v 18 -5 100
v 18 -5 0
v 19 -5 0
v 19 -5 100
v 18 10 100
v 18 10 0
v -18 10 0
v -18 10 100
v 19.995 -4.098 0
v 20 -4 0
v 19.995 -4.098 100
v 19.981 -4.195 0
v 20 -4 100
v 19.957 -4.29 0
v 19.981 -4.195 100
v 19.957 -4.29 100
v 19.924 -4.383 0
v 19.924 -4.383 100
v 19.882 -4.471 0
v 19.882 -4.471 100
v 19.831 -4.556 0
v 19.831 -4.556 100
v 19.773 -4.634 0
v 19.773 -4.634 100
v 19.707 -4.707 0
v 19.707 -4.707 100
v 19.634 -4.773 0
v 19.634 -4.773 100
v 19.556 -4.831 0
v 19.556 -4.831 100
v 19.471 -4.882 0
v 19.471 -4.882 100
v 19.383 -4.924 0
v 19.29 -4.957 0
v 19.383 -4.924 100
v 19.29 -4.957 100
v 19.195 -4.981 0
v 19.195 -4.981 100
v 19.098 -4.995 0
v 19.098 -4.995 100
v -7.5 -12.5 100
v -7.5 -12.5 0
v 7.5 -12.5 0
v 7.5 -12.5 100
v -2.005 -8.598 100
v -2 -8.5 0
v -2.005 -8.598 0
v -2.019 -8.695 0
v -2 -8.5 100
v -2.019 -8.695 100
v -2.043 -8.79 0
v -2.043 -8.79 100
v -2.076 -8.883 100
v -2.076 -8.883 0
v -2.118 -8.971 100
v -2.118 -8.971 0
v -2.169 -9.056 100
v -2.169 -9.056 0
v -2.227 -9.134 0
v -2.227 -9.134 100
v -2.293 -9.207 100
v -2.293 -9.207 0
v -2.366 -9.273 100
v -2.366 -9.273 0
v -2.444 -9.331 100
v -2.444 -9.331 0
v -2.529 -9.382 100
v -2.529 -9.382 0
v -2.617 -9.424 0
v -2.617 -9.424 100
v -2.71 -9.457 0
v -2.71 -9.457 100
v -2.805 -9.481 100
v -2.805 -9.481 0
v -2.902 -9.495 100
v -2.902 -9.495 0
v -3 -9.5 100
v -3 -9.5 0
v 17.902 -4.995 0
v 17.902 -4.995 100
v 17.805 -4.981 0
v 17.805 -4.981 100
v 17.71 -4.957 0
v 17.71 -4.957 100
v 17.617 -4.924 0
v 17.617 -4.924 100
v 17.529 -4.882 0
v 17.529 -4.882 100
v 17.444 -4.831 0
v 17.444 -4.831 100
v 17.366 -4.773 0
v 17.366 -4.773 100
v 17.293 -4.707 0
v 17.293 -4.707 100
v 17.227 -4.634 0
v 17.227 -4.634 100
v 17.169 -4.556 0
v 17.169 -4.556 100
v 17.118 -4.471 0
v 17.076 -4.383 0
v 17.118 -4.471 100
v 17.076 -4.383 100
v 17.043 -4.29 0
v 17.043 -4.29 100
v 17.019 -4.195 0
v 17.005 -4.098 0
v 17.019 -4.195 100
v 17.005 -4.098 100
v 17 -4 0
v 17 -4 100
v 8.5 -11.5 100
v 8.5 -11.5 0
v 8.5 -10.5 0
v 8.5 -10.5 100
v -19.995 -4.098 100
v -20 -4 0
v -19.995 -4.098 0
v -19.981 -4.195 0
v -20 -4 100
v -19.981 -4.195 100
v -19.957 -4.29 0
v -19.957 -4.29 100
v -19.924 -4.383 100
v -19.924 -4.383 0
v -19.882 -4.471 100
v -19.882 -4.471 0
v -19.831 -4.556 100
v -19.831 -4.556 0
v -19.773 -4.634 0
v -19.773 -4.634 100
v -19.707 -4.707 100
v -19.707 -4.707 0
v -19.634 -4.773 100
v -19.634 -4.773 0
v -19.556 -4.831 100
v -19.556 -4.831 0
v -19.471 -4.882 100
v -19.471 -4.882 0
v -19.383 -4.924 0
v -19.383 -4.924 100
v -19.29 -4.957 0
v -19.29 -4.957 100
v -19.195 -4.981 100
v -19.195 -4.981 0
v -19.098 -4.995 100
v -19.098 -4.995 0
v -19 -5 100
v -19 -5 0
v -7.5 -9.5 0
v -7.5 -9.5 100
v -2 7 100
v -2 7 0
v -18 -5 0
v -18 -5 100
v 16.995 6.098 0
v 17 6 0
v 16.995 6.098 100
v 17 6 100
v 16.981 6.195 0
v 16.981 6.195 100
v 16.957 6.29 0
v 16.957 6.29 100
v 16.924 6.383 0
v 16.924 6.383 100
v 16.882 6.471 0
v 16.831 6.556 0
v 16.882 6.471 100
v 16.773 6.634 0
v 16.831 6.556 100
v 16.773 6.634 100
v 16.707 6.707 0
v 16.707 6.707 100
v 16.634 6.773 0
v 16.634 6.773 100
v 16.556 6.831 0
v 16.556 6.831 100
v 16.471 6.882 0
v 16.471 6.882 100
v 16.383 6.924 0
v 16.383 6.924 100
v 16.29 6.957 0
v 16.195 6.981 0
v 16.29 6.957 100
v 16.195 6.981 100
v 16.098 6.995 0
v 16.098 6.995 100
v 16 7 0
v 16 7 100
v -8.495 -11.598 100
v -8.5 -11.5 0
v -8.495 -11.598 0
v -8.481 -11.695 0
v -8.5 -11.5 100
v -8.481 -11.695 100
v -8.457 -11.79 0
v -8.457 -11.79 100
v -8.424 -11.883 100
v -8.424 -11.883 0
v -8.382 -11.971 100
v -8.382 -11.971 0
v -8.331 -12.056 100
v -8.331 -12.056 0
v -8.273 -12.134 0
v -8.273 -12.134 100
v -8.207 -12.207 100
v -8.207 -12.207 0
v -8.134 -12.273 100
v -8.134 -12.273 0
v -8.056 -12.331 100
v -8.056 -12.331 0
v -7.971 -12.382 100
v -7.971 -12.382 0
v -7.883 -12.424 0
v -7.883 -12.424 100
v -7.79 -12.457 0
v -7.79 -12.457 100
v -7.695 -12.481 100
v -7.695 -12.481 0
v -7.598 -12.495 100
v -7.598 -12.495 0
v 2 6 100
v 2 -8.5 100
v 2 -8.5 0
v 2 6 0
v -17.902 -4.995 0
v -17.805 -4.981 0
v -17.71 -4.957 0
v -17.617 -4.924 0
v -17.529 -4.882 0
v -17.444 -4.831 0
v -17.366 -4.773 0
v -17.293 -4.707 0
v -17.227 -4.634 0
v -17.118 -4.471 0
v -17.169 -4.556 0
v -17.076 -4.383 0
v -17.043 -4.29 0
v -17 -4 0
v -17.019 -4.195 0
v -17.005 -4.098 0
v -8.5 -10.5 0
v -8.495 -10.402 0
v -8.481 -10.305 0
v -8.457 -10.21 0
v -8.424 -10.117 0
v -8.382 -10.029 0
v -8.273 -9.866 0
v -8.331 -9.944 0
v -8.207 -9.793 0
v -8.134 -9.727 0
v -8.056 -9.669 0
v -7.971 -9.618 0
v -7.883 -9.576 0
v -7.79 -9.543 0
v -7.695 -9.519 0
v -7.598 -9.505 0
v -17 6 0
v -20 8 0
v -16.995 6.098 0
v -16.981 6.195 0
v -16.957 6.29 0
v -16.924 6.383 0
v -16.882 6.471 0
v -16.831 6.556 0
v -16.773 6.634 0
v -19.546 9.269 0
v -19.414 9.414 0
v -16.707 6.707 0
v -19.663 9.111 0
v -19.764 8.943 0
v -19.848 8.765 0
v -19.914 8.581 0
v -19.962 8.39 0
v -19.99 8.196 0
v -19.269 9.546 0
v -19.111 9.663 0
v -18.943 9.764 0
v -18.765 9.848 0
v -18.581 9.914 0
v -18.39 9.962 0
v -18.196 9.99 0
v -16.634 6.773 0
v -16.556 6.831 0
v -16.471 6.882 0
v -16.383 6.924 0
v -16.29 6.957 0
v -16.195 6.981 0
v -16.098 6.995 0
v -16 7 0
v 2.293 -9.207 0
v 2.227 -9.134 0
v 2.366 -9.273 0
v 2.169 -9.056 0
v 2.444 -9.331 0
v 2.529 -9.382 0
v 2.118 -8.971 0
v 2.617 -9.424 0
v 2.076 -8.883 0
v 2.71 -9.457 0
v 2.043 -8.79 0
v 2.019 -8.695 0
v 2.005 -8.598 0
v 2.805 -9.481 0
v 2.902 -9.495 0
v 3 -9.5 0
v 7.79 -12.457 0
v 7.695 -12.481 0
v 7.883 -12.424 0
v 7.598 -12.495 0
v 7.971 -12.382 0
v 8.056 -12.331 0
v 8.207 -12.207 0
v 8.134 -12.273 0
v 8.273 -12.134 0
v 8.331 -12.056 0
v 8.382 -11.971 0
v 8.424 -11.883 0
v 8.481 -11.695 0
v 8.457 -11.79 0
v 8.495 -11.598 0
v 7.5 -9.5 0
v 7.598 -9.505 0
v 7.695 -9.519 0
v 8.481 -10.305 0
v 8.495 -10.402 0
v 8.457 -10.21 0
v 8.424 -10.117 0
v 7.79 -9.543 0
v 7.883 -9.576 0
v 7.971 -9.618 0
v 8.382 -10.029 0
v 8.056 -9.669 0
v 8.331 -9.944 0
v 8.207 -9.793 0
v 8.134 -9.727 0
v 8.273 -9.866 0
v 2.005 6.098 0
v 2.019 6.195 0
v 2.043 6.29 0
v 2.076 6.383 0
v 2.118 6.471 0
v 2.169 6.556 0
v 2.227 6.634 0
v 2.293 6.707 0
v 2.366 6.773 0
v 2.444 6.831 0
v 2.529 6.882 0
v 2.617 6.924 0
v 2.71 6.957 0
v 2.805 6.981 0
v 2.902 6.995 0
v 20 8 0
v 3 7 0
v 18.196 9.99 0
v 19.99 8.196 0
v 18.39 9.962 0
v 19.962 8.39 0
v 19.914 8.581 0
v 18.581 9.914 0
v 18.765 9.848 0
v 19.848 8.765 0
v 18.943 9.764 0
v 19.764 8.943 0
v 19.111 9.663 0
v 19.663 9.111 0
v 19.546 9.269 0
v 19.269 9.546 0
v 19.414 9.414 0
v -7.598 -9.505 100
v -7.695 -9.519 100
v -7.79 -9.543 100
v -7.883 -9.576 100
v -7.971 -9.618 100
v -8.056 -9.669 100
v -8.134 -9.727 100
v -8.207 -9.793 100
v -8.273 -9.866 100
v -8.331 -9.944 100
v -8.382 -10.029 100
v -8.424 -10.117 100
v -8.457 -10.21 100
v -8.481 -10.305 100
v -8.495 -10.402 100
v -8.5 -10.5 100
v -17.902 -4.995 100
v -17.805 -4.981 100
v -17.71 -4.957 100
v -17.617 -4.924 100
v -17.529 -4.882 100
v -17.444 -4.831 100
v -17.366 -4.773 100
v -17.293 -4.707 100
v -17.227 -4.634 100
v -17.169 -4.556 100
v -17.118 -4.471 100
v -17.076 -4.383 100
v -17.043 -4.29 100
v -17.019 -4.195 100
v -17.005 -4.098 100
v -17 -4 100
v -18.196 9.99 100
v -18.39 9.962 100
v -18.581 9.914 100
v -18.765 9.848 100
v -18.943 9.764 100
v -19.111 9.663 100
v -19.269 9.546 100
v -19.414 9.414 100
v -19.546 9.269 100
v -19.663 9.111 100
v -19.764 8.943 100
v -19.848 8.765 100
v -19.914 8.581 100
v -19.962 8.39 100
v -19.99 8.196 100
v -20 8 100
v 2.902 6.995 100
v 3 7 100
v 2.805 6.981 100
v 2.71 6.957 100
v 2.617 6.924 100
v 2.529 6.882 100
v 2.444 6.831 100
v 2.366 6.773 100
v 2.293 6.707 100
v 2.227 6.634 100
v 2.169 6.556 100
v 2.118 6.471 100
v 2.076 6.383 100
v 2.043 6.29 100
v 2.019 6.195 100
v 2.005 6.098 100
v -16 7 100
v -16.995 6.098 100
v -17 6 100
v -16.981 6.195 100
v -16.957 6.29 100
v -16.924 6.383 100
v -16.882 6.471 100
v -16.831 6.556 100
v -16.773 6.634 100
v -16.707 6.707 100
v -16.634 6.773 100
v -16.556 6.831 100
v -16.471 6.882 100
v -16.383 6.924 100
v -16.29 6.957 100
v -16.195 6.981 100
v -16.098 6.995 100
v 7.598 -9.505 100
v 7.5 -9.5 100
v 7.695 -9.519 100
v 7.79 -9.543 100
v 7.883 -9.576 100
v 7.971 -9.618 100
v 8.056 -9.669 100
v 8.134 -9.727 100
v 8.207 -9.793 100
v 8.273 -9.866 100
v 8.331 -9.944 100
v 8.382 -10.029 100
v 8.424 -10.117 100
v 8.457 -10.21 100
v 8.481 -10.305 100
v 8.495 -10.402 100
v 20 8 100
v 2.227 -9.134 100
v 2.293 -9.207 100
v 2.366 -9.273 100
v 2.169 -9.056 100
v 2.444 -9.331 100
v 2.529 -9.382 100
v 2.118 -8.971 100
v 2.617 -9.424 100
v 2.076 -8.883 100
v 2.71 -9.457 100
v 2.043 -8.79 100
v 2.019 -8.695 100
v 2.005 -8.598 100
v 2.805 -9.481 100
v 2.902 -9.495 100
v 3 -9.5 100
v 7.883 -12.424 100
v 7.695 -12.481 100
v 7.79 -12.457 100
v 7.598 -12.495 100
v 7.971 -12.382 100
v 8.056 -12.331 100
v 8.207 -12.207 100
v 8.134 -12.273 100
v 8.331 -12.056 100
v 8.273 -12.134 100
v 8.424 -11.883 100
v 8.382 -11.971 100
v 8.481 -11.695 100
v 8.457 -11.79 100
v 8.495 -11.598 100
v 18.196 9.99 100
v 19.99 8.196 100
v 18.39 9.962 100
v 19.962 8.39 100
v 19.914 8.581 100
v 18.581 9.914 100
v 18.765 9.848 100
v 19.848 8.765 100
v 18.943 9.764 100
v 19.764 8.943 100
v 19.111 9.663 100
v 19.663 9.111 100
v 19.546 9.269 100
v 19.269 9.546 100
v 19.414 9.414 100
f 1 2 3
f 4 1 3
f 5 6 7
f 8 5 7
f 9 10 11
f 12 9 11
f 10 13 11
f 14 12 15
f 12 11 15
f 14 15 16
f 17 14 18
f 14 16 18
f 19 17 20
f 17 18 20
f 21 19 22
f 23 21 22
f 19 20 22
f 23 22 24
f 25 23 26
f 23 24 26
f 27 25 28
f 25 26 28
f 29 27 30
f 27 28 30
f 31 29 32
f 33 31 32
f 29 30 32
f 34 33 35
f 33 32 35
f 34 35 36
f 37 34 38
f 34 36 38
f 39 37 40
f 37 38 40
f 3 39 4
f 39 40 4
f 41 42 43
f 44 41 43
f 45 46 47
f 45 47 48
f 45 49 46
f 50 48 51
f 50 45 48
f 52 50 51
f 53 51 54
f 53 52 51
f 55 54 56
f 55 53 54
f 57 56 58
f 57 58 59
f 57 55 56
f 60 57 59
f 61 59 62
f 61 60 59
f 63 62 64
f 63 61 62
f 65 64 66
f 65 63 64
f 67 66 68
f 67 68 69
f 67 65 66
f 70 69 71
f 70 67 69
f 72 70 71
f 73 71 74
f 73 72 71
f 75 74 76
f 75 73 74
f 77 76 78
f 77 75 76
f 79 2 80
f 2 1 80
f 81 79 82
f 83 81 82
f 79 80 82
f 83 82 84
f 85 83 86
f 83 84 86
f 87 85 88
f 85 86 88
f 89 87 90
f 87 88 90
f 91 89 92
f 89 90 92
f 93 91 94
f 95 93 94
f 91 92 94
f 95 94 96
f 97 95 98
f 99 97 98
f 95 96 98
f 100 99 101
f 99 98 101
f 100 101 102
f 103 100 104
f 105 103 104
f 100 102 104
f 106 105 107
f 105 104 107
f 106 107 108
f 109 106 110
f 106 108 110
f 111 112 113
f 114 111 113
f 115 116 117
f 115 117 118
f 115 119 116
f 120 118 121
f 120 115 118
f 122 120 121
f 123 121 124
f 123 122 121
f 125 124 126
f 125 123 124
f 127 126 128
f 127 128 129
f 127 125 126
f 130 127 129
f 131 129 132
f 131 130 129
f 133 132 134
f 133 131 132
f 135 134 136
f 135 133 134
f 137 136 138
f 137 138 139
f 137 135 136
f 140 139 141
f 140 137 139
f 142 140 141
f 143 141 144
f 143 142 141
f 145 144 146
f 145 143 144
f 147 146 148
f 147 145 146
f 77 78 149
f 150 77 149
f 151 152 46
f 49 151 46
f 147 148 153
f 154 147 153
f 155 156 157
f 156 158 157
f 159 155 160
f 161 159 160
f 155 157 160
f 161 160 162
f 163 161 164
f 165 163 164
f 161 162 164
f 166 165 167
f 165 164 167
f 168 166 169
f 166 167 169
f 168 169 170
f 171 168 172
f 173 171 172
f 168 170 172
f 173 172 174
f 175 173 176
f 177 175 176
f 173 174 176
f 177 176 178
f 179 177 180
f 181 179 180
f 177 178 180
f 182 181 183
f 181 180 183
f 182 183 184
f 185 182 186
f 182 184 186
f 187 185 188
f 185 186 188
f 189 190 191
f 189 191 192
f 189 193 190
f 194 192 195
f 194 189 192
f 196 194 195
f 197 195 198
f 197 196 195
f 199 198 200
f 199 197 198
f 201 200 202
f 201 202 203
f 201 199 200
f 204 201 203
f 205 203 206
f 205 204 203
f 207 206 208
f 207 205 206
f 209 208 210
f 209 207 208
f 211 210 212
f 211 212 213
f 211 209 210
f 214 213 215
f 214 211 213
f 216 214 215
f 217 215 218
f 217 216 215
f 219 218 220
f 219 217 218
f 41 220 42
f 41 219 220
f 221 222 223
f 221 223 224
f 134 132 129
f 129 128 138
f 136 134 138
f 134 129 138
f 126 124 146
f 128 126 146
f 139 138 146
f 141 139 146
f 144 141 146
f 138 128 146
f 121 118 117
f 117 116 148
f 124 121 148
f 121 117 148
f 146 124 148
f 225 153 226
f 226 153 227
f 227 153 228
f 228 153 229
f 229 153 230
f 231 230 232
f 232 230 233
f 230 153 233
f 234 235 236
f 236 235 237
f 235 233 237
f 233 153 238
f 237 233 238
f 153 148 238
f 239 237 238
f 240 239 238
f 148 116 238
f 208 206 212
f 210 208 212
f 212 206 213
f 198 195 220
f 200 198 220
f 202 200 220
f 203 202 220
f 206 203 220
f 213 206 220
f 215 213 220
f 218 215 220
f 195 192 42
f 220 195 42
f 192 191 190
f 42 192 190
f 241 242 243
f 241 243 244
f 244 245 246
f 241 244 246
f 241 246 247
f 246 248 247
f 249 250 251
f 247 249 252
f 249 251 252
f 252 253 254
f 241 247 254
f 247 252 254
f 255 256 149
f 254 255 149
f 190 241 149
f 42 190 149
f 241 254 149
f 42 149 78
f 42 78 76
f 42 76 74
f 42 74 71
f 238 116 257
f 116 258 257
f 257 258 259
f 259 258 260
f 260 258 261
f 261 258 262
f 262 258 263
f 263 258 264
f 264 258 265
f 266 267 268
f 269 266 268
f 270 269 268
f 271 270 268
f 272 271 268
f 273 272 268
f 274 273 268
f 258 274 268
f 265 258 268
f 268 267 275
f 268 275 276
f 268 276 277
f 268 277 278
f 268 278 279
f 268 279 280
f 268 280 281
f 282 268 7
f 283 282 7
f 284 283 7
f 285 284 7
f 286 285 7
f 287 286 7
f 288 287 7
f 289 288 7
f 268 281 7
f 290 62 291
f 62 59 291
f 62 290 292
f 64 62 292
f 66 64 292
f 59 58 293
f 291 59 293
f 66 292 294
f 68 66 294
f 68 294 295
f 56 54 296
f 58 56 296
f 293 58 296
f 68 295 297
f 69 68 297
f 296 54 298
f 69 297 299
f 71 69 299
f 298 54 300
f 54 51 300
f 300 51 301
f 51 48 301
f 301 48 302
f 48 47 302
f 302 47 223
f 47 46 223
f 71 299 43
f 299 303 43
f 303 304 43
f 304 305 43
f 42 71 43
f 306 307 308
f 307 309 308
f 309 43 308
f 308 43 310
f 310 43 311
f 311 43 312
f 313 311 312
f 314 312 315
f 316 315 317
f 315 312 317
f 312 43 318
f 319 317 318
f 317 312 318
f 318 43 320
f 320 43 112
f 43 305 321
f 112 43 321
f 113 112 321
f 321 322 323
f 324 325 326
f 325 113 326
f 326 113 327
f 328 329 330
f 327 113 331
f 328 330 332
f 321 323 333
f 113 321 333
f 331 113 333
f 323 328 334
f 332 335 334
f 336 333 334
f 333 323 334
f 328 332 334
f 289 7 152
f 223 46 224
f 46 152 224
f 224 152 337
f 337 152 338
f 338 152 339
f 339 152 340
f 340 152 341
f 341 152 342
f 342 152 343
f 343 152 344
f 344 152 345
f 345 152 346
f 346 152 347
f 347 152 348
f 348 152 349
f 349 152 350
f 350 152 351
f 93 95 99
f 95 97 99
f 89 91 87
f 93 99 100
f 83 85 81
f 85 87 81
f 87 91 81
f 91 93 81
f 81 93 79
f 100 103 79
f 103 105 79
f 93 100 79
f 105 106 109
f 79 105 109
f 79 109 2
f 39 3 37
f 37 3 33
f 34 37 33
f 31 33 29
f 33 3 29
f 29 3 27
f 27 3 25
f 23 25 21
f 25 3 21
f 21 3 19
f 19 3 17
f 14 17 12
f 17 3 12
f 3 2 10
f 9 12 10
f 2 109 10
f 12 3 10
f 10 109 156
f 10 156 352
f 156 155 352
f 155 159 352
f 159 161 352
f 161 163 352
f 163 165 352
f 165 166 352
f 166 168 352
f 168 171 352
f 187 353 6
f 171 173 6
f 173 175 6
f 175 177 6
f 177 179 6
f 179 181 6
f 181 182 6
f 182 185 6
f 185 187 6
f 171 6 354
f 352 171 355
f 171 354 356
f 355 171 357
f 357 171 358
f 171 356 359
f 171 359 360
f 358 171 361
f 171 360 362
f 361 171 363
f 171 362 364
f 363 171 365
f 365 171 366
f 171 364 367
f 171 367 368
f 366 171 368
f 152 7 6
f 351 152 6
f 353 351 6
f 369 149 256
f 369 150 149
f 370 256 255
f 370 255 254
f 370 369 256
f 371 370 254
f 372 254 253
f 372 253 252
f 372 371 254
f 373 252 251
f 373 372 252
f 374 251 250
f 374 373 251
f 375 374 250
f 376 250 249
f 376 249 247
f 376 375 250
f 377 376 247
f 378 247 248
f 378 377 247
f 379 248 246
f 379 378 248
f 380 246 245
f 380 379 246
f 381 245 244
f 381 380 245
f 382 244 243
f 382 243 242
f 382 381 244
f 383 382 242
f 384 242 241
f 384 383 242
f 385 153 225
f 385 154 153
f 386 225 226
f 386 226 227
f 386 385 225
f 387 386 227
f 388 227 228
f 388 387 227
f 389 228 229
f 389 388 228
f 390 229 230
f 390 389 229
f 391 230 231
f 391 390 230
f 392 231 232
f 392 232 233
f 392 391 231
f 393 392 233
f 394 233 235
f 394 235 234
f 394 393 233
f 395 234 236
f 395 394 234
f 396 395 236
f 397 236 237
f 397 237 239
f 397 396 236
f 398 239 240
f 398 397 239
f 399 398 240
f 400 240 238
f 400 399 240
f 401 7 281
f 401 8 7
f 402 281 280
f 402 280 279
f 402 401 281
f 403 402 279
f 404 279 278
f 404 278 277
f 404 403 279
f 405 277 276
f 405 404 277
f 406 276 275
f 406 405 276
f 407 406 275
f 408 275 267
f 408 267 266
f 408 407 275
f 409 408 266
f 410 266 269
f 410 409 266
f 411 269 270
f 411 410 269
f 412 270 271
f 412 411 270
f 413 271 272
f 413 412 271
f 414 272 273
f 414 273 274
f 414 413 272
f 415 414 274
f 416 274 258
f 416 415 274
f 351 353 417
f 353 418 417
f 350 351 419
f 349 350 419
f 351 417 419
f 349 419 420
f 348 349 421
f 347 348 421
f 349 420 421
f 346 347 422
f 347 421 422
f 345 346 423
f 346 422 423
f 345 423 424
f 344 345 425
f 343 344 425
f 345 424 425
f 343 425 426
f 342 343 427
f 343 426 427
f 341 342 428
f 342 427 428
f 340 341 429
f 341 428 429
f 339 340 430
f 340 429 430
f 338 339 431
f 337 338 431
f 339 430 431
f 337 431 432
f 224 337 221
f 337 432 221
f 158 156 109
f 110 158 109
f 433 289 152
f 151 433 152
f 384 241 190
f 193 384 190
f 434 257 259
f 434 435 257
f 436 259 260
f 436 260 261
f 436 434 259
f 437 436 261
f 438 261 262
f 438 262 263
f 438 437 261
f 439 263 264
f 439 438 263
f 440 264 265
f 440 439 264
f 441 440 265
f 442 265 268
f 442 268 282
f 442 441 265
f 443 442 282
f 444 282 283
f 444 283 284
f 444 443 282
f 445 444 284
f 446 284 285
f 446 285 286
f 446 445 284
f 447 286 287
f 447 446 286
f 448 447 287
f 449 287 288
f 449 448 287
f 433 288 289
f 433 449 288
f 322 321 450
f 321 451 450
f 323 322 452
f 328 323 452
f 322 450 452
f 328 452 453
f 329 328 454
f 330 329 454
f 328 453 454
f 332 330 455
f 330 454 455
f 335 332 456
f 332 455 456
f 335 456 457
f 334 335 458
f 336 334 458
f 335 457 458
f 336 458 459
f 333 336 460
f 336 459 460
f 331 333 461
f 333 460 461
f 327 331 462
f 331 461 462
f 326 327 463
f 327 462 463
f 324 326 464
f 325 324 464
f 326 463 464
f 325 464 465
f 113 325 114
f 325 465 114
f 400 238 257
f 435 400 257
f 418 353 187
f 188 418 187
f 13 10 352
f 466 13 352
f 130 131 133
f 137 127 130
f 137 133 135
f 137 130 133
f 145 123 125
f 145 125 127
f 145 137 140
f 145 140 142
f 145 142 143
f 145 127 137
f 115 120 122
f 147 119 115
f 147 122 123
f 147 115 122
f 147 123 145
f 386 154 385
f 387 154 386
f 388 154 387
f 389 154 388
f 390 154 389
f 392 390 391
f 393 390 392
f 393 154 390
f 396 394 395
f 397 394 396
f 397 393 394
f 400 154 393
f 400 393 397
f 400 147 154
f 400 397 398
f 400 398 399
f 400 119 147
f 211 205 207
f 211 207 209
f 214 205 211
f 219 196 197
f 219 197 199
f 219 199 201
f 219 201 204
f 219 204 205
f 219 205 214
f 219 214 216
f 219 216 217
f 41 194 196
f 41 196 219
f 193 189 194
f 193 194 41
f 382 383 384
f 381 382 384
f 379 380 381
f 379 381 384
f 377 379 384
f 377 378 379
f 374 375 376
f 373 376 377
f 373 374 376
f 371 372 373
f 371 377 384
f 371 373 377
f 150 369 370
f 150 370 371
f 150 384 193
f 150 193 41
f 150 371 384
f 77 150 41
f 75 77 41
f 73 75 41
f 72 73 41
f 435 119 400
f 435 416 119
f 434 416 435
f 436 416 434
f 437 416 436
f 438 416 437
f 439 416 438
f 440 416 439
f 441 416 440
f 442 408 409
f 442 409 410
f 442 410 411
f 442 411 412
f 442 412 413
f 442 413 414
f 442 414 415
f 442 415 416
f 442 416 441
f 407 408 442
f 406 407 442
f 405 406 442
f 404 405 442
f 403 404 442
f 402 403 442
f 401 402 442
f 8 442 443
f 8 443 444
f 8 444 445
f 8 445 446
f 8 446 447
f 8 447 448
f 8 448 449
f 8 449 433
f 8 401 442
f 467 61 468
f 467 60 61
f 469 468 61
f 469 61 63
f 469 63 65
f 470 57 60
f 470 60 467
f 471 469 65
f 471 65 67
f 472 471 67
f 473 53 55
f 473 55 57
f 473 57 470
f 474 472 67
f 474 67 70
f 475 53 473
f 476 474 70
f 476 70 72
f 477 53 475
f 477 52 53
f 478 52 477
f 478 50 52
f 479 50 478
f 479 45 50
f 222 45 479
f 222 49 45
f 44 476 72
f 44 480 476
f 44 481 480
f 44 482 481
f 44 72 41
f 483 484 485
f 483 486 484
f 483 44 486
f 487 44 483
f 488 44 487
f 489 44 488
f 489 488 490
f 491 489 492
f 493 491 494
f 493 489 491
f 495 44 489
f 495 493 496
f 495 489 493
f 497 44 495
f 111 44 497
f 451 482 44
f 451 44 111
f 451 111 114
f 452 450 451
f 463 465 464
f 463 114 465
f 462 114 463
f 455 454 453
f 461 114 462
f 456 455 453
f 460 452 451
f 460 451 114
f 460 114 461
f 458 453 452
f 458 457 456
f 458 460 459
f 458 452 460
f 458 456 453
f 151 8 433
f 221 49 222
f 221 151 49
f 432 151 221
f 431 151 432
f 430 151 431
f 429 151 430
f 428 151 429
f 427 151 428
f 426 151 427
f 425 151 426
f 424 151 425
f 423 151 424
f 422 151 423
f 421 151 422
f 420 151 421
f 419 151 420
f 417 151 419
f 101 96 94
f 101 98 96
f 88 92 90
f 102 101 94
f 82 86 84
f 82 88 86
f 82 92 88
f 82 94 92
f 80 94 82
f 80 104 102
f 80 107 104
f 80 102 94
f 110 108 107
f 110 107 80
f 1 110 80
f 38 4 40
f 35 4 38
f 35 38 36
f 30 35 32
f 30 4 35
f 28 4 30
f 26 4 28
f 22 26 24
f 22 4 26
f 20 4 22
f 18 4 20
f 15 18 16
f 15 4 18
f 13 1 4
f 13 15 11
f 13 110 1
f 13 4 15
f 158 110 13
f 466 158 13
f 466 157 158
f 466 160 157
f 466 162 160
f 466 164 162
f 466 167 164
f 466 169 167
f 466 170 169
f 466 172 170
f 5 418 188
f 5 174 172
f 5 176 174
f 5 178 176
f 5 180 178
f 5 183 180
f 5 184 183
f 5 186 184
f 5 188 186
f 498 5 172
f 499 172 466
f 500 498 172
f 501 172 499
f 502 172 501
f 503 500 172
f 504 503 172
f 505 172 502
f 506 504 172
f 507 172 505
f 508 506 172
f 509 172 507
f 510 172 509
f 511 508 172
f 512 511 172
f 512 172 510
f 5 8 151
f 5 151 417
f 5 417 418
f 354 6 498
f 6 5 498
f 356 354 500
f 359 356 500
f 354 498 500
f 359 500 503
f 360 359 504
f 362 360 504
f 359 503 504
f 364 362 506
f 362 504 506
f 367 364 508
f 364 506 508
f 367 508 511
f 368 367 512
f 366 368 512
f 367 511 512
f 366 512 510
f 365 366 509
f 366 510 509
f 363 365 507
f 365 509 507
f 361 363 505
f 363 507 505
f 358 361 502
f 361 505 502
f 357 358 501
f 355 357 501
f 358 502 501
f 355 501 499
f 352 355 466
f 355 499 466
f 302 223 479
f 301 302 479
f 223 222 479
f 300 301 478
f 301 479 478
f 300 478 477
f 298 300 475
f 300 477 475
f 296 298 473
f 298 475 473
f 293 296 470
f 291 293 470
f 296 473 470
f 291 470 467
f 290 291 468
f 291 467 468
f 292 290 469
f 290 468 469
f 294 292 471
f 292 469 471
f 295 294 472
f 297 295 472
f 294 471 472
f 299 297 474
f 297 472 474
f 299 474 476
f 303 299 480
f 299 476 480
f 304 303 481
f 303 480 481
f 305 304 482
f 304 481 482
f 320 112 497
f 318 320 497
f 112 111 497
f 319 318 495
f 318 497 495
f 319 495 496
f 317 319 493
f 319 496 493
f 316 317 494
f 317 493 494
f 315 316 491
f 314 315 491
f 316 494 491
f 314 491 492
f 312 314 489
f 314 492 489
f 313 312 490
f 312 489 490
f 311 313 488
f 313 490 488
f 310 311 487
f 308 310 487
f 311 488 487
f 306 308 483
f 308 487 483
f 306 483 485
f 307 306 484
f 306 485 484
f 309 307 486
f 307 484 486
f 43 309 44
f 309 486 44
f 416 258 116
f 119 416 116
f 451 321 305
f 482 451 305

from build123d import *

# Parameters (mm, degrees)
F1_DEPTH = 100
F2_R     = 2
F3_R     = 1


with BuildPart() as f1:
    # F0 (on Top) → F1 (new body)
    with BuildSketch(Plane.XY):
        Polygon((20, 10), (-20, 10), (-20, -5), (-17, -5), (-17, 7), (-2, 7), (-2, -9.5), (-8.5, -9.5), (-8.5, -12.5), (0, -12.5), (8.5, -12.5), (8.5, -9.5), (2, -9.5), (2, 7), (17, 7), (17, -5), (20, -5), align=None)
    extrude(amount=F1_DEPTH)

    # F2
    f2_edges = [f1.edges().sort_by_distance(p)[0] for p in [
        (-20, 10, 50),
        (20, 10, 50),
    ]]
    fillet(f2_edges, radius=F2_R)

    # F3
    f3_edges = [f1.edges().sort_by_distance(p)[0] for p in [
        (-17, -5, 50),
        (-20, -5, 50),
        (-17, 7, 50),
        (2, 7, 50),
        (8.5, -12.5, 50),
        (8.5, -9.5, 50),
        (-8.5, -12.5, 50),
        (-8.5, -9.5, 50),
        (-2, -9.5, 50),
        (2, -9.5, 50),
        (17, -5, 50),
        (20, -5, 50),
        (17, 7, 50),
    ]]
    fillet(f3_edges, radius=F3_R)


solid = f1.part
